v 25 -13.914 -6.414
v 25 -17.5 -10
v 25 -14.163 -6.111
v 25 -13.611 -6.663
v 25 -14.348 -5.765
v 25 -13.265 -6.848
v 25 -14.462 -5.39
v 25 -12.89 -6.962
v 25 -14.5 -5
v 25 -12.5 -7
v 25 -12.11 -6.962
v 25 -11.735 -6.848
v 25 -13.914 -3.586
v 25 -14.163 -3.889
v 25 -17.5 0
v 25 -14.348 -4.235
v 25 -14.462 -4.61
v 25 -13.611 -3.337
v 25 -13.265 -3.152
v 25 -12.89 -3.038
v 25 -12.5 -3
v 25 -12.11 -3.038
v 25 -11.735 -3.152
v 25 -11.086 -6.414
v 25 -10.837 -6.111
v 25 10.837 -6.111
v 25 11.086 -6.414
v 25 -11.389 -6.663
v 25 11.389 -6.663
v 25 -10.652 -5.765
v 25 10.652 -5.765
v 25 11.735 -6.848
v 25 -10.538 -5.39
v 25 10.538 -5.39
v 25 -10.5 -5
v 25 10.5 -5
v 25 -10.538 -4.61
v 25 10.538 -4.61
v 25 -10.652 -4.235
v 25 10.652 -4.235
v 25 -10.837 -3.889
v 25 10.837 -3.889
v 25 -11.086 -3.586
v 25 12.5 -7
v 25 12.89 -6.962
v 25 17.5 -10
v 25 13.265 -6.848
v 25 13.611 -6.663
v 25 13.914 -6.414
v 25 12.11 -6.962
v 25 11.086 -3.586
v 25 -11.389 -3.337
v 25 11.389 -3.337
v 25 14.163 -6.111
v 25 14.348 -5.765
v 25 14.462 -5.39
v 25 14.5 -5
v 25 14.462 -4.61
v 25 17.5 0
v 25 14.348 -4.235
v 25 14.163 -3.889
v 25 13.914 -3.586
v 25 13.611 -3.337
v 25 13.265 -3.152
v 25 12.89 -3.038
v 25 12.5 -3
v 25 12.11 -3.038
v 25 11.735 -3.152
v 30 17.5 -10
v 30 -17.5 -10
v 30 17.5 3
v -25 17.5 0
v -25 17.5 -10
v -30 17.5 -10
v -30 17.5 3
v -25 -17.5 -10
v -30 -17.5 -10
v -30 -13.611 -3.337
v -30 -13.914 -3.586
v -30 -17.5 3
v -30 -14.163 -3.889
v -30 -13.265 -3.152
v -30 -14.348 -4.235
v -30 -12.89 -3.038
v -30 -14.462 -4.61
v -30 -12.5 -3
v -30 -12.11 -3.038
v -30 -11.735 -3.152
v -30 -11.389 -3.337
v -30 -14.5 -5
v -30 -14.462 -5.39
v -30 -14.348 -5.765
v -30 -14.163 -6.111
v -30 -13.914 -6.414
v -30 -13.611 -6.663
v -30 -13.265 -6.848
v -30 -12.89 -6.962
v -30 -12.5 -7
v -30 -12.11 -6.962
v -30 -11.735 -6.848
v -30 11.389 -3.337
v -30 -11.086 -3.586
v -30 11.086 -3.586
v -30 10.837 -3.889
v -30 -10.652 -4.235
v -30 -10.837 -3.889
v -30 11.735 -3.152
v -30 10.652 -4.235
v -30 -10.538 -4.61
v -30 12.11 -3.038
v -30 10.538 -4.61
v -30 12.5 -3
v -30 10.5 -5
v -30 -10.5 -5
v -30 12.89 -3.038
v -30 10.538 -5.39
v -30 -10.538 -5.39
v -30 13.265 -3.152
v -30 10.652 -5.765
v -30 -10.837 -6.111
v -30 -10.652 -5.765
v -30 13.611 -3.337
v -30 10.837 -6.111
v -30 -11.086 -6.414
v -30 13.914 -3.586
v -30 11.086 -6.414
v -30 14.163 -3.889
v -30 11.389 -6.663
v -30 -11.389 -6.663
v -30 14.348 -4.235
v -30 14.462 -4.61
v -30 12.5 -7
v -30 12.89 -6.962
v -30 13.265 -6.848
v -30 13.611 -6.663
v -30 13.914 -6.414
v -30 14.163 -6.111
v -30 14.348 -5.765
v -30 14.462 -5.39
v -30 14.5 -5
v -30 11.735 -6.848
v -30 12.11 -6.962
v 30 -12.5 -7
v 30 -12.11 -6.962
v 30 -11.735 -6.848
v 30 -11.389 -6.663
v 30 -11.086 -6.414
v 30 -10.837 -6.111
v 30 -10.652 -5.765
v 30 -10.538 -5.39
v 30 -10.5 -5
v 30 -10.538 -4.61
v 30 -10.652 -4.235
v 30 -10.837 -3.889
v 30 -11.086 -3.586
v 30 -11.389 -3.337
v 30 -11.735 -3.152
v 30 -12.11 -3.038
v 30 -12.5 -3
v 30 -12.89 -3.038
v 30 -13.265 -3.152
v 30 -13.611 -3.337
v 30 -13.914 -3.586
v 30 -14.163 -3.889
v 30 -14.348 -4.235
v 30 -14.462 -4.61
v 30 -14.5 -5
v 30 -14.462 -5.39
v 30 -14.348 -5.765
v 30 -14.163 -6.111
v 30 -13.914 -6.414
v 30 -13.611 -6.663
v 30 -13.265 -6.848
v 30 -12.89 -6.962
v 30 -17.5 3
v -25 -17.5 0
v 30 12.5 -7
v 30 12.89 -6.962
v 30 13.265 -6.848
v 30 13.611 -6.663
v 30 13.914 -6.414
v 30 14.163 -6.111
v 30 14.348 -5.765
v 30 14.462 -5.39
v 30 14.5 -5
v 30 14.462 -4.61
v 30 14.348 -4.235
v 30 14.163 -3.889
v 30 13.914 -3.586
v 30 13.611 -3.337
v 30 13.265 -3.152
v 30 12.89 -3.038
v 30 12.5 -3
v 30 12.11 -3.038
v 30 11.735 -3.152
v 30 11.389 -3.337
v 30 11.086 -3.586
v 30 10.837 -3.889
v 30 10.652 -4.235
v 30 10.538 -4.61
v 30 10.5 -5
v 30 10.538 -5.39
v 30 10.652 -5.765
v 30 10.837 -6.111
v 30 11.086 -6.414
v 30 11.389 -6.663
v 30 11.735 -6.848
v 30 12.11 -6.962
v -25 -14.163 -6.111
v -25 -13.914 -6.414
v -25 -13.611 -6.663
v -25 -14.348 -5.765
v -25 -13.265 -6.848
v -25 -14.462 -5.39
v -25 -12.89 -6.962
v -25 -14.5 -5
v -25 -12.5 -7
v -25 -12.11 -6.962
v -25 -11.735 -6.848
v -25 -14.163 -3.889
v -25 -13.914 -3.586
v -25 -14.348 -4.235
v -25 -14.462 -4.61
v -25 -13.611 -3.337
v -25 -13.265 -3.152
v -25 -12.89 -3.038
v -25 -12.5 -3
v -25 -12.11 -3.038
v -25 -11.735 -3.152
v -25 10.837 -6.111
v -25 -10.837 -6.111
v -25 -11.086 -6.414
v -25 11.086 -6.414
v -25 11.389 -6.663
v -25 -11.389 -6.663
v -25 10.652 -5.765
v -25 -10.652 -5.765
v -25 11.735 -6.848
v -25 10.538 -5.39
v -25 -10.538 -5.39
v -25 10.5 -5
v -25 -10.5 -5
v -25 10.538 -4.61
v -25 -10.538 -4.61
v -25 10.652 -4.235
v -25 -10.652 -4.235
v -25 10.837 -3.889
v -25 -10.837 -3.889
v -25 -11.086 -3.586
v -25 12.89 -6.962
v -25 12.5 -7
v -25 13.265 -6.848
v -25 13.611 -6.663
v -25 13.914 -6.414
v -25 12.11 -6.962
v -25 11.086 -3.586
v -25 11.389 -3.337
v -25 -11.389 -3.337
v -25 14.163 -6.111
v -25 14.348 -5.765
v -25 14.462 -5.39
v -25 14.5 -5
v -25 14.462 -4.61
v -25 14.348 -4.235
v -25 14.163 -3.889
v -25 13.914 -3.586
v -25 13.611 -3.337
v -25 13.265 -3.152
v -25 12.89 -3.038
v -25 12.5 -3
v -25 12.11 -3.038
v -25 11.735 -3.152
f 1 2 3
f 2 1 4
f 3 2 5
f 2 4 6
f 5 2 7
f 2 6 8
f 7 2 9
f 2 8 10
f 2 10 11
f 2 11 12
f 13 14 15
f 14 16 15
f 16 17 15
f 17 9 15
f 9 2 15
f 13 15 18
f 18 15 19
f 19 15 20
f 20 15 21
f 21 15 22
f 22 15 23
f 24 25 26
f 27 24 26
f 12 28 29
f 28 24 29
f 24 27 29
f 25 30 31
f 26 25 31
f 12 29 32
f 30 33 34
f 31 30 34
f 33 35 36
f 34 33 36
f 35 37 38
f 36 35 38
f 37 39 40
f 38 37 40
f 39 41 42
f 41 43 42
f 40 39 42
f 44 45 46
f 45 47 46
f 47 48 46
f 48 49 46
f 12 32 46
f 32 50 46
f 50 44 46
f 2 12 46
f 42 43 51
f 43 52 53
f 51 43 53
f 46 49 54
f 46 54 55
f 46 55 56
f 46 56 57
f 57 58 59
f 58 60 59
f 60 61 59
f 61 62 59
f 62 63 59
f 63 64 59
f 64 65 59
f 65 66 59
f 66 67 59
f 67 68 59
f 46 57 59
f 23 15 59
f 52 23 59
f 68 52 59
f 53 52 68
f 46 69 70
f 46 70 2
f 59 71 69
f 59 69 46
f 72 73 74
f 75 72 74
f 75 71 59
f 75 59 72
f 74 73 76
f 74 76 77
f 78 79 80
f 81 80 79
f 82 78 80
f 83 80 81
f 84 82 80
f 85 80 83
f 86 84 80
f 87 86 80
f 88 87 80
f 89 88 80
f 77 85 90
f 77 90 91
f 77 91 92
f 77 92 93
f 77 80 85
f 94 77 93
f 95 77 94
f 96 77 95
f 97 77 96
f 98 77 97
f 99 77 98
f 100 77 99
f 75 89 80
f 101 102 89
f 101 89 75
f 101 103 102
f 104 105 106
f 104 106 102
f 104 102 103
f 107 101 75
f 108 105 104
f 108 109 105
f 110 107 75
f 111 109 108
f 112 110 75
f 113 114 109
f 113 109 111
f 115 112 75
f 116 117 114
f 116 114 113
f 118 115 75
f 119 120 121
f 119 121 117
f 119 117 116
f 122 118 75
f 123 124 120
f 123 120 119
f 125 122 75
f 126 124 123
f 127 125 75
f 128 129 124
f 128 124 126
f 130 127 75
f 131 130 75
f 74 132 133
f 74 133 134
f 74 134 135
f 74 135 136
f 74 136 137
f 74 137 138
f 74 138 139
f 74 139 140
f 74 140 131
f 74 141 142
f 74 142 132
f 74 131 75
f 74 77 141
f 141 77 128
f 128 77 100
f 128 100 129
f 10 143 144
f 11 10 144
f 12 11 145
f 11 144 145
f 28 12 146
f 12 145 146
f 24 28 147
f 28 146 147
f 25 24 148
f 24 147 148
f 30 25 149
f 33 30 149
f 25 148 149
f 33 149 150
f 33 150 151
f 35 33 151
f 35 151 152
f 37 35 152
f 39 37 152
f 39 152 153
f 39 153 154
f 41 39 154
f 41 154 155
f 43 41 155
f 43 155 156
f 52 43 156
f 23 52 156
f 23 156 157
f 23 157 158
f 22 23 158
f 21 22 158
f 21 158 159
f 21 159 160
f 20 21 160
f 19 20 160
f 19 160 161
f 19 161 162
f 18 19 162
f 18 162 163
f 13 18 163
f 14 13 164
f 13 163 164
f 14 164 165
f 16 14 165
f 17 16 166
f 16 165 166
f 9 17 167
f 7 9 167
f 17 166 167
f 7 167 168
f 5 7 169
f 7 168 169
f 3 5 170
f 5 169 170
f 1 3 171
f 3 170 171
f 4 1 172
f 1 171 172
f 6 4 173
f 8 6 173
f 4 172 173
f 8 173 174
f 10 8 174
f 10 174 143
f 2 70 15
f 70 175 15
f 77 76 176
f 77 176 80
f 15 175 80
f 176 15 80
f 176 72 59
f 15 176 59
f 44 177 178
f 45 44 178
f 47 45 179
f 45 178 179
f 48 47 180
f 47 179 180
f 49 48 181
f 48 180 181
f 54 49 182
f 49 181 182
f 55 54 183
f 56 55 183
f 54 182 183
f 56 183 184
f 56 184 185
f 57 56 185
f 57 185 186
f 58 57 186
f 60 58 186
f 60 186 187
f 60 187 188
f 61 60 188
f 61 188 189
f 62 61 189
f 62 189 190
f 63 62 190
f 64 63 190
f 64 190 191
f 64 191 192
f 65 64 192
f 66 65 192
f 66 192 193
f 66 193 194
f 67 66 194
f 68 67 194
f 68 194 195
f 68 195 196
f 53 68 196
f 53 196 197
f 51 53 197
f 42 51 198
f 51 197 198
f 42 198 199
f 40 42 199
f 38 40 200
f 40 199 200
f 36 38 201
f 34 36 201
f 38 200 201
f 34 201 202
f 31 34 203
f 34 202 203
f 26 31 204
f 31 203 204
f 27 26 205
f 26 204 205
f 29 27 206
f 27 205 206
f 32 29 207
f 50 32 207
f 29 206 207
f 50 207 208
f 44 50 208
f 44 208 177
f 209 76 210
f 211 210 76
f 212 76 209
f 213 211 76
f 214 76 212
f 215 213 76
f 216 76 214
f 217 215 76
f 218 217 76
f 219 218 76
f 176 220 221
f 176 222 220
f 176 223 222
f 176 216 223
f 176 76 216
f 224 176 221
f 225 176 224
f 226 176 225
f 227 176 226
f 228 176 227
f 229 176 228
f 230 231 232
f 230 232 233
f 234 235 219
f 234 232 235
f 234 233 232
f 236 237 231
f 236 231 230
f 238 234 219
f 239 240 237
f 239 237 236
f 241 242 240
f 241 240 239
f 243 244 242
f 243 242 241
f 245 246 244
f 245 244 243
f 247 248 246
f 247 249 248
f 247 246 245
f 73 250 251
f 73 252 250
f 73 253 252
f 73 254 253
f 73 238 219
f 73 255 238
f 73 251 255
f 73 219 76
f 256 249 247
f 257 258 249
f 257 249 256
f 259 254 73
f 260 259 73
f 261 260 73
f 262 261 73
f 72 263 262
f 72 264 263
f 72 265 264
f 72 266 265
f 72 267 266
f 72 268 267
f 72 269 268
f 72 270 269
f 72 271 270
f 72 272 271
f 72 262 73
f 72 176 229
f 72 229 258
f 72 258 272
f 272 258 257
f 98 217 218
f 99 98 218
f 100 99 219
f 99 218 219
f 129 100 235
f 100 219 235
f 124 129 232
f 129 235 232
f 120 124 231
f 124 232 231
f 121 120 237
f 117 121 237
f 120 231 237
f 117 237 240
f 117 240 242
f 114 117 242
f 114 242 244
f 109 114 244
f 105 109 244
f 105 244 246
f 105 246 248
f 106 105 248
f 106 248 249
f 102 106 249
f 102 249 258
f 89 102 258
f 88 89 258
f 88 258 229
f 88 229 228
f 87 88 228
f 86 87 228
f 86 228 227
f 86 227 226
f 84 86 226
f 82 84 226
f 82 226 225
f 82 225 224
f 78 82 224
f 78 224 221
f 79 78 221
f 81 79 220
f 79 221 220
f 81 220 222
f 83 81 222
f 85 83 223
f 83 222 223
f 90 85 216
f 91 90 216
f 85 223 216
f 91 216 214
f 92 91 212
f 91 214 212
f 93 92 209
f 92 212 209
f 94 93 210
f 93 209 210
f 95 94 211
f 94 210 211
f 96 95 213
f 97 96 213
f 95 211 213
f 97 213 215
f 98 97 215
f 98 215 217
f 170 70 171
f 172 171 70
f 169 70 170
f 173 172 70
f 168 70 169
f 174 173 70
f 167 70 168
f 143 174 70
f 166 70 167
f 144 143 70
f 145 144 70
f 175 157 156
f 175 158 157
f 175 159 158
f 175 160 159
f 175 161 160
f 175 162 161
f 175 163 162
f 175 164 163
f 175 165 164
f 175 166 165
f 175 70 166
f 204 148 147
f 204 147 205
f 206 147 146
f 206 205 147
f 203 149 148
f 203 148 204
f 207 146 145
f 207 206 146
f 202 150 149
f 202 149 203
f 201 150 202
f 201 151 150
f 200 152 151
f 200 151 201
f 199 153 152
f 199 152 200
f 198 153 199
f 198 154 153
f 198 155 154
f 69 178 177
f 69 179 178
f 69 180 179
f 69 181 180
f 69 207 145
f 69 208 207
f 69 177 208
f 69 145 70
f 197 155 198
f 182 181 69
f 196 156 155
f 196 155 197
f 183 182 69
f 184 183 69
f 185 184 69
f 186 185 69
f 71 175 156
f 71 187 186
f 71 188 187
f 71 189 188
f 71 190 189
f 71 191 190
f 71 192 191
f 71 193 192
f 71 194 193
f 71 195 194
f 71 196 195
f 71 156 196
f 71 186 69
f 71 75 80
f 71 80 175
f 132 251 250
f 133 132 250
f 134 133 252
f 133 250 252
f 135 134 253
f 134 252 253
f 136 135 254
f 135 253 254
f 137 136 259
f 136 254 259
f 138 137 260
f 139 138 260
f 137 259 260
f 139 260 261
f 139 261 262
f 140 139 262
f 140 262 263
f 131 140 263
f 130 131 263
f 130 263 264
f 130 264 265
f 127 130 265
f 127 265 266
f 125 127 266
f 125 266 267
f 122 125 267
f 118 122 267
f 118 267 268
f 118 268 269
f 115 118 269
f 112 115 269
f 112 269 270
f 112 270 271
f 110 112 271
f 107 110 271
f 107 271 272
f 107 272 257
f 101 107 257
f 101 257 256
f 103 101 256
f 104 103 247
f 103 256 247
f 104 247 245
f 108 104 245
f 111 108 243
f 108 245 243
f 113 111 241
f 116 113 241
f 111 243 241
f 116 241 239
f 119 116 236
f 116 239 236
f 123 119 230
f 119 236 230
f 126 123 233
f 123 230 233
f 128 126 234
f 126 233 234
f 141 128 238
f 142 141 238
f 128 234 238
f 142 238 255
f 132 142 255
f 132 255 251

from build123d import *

# Parameters (mm, degrees)
SKETCH2_W           = 60
SKETCH2_H           = 35
BOSS_EXTRUDE1_DEPTH = 3
SKETCH3_W           = 5
SKETCH3_H           = 35
BOSS_EXTRUDE2_DEPTH = 10
SKETCH4_R           = 2
CUT_EXTRUDE1_DEPTH  = 64.294944506


with BuildPart() as part:
    # Sketch2 → Boss-Extrude1 (new body)
    with BuildSketch(Plane.XY):
        Rectangle(SKETCH2_W, SKETCH2_H)
    extrude(amount=BOSS_EXTRUDE1_DEPTH)

    # Sketch3 → Boss-Extrude2 (add)
    with BuildSketch(Plane(origin=(0, 0, 0), x_dir=(-1, 0, 0), z_dir=(0, 0, -1))):
        with Locations((-27.5, 0)):
            Rectangle(SKETCH3_W, SKETCH3_H)
        with Locations((27.5, 0)):
            Rectangle(SKETCH3_W, SKETCH3_H)
    extrude(amount=BOSS_EXTRUDE2_DEPTH)

    # Sketch4 → Cut-Extrude1 (cut, through all)
    with BuildSketch(Plane(origin=(30, 0, 0), x_dir=(0, 0, -1), z_dir=(1, 0, 0))):
        with Locations((5, 12.5)):
            Circle(SKETCH4_R)
        with Locations((5, -12.5)):
            Circle(SKETCH4_R)
    extrude(amount=-CUT_EXTRUDE1_DEPTH, mode=Mode.SUBTRACT)


solid = part.part
